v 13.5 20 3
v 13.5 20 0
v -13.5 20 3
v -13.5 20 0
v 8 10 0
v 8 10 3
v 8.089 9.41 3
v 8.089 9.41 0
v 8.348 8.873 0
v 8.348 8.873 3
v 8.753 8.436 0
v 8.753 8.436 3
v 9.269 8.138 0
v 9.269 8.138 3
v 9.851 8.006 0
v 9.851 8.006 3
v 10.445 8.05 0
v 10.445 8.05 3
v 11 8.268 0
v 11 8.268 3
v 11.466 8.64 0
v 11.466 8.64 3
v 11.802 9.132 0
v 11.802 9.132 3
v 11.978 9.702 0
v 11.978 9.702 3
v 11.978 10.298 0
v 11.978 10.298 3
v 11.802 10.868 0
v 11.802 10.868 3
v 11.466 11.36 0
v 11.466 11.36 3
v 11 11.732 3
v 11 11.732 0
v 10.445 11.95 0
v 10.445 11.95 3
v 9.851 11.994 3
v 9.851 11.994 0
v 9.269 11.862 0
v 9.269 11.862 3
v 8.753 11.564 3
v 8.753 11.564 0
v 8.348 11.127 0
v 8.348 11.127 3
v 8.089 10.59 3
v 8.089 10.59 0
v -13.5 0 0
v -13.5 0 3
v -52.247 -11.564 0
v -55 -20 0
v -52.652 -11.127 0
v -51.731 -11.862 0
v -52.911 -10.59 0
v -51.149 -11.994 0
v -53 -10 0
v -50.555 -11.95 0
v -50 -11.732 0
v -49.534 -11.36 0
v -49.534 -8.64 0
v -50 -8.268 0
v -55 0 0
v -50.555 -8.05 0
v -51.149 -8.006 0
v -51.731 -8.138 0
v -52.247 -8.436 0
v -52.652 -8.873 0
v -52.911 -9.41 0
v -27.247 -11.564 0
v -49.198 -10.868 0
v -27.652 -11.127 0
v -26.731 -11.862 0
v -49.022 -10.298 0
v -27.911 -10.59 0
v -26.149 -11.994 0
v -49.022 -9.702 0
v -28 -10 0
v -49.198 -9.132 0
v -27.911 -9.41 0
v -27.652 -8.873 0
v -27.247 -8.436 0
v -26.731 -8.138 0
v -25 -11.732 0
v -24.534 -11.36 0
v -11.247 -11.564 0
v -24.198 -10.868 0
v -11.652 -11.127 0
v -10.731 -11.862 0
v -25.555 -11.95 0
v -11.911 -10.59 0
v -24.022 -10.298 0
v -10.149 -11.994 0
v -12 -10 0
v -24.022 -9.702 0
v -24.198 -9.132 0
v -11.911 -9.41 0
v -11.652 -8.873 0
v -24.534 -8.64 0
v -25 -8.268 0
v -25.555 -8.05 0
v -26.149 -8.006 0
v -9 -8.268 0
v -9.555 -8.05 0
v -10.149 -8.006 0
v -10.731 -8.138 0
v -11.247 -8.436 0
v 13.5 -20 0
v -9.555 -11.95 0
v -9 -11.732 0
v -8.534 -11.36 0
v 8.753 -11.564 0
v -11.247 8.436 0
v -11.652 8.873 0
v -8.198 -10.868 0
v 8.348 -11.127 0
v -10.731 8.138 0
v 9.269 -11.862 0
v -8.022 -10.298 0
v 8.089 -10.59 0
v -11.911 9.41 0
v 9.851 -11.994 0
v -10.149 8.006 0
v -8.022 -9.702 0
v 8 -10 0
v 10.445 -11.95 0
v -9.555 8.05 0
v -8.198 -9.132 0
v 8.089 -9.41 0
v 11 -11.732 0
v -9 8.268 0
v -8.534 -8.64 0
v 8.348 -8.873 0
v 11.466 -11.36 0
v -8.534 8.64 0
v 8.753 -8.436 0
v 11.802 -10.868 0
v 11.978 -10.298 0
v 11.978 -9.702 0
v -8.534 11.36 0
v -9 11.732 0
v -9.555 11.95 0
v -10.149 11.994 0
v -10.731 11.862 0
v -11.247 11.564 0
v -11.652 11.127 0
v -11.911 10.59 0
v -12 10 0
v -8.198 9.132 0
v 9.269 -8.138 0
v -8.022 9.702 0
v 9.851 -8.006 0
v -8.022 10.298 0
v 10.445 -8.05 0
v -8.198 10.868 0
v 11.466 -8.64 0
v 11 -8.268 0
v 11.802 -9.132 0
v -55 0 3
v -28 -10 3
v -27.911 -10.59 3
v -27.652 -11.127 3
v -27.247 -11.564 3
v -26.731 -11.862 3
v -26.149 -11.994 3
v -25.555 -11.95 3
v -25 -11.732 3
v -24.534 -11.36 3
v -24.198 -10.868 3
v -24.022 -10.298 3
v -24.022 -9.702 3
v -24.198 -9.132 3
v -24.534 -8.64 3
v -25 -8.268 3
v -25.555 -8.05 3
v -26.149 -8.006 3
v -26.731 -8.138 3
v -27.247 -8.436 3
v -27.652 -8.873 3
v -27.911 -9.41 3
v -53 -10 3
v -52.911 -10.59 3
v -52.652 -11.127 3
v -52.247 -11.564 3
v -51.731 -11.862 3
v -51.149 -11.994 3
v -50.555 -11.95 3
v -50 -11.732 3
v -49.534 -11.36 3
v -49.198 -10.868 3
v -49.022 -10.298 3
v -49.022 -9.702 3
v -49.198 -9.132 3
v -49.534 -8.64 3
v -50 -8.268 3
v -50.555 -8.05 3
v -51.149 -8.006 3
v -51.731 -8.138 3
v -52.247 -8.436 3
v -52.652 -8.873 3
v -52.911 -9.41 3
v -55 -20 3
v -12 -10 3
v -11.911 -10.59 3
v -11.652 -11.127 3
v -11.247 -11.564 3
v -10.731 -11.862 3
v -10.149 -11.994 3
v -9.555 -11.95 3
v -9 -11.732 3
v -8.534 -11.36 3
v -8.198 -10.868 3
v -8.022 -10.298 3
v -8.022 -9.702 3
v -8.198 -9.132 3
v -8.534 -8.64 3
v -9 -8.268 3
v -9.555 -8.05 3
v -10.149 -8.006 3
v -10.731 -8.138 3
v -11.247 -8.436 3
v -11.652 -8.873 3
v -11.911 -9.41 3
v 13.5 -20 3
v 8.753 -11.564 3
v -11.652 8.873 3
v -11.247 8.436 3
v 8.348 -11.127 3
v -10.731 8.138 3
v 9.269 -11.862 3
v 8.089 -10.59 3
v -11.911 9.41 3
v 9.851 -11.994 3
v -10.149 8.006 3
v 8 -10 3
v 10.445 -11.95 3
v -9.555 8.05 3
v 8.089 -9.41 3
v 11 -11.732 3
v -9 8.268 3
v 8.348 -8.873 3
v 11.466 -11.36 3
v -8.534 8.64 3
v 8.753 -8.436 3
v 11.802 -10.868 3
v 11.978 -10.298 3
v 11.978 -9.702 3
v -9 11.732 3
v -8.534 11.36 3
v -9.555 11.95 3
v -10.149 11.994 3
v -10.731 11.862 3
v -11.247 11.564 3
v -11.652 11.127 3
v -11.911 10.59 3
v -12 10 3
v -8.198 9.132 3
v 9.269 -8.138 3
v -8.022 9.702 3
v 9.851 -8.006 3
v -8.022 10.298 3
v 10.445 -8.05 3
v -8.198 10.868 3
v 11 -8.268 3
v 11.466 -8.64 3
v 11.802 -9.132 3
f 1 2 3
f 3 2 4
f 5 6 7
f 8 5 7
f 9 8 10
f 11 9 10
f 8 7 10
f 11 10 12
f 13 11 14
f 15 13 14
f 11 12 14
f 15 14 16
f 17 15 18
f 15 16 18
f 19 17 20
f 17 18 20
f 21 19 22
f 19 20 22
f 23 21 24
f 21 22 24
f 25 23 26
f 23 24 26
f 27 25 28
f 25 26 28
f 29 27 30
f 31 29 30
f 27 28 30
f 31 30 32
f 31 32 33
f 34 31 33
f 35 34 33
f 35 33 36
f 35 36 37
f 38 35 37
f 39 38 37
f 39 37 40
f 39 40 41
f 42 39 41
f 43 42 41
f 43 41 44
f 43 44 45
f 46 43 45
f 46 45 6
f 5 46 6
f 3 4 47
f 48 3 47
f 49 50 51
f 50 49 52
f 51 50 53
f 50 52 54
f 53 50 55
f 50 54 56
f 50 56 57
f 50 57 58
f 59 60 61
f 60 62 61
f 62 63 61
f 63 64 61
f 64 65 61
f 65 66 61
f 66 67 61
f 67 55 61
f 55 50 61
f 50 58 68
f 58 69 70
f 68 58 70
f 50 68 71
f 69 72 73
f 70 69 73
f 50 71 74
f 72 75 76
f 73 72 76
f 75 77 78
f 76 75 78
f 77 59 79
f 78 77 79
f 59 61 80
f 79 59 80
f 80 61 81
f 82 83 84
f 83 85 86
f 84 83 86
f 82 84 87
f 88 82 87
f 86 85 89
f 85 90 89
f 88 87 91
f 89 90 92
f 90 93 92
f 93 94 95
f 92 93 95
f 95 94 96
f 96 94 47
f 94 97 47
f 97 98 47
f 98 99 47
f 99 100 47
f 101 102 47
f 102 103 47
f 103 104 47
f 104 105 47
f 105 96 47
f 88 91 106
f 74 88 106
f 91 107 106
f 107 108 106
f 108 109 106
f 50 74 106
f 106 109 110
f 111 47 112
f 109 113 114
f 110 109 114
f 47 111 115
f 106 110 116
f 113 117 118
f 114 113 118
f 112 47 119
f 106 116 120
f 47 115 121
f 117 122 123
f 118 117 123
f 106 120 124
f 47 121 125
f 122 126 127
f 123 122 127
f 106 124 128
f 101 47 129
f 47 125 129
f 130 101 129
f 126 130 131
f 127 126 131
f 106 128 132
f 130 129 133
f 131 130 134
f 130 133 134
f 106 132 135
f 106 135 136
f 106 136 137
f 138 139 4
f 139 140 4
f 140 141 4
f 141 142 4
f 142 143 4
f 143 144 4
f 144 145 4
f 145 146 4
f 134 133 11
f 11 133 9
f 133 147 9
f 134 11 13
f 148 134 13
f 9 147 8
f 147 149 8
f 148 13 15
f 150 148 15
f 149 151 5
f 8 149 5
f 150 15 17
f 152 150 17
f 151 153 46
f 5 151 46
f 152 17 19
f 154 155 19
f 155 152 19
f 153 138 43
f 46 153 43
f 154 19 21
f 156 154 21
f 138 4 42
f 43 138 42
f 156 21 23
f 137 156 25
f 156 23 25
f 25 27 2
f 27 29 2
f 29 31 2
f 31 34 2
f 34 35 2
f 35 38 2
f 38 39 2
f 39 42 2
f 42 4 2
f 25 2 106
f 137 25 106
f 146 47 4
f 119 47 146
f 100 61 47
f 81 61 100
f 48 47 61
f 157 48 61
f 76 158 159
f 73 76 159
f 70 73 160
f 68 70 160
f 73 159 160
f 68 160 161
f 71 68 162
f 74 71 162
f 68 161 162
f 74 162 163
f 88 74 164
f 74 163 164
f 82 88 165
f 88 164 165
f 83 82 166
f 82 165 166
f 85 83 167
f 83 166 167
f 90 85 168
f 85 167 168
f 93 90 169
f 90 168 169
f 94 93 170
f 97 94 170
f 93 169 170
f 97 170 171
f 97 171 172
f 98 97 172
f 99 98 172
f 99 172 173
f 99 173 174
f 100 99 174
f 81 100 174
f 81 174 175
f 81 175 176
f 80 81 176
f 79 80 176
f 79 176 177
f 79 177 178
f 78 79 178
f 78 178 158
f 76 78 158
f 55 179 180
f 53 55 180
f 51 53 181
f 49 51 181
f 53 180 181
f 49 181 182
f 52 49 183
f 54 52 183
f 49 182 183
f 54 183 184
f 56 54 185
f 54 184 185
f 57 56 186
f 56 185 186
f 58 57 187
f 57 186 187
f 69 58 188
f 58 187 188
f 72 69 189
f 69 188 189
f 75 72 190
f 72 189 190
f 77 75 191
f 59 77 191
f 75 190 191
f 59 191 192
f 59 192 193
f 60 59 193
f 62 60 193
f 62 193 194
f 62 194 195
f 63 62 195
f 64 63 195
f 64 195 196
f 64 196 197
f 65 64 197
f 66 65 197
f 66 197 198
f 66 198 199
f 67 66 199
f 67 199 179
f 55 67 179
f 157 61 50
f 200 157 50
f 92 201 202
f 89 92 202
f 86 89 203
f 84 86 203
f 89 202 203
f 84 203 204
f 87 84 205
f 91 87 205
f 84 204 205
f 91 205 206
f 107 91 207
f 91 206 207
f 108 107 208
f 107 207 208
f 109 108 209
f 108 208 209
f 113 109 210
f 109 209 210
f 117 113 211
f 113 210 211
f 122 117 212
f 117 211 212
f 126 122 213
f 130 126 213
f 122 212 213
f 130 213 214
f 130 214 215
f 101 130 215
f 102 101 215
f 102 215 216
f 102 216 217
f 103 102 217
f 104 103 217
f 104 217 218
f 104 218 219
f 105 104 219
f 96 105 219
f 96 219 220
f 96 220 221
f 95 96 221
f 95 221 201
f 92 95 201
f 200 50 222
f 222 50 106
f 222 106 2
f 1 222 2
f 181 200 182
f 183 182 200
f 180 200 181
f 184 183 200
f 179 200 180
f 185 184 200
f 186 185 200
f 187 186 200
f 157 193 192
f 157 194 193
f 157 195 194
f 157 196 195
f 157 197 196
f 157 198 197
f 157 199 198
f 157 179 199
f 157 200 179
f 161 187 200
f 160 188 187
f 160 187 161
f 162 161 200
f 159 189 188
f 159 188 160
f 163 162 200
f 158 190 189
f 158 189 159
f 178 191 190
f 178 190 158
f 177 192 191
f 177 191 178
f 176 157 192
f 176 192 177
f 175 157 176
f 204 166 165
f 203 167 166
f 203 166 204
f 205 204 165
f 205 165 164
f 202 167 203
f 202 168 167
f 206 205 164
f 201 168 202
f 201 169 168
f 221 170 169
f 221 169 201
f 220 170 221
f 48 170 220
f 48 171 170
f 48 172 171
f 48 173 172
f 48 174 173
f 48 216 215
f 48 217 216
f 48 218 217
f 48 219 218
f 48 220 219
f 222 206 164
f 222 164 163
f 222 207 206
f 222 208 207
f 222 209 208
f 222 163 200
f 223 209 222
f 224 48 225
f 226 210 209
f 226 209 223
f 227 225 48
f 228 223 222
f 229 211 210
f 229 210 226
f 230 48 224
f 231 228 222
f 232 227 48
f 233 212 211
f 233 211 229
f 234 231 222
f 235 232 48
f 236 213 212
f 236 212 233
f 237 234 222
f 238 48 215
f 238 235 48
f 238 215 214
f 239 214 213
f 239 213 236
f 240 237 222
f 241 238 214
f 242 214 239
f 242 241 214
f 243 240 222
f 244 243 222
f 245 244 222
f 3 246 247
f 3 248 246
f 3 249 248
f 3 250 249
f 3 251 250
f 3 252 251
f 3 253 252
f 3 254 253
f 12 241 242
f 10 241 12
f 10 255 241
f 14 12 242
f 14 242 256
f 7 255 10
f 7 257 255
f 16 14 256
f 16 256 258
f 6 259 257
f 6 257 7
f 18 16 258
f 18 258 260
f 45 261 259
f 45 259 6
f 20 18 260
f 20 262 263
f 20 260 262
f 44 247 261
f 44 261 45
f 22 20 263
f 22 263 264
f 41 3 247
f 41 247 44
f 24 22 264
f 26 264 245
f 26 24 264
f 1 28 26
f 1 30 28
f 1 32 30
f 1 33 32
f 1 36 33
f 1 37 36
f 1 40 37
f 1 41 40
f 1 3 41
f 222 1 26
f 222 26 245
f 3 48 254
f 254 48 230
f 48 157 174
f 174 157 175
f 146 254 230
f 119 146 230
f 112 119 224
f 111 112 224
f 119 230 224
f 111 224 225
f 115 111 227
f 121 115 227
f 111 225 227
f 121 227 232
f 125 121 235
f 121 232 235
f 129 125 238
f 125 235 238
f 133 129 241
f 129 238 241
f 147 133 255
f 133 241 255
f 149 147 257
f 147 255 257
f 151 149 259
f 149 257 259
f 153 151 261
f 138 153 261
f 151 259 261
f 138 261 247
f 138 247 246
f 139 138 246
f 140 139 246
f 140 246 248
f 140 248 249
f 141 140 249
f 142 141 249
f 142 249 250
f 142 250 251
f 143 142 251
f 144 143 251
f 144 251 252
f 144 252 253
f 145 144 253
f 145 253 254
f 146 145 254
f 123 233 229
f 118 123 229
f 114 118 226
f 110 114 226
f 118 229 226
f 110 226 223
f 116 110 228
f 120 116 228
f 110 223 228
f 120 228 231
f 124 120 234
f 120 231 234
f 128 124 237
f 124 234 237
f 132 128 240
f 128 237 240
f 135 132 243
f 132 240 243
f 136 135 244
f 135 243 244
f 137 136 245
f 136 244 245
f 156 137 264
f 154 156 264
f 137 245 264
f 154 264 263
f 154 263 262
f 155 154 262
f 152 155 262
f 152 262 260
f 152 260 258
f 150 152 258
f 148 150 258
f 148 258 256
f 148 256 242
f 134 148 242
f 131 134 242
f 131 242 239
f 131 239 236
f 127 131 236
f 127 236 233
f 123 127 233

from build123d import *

# Parameters (mm, degrees)
F1_DEPTH = 3
F2_D     = 4


with BuildPart() as f1:
    # F0 (on Top) → F1 (new body)
    with BuildSketch(Plane.XY):
        Polygon((-13.5, -20), (13.5, -20), (13.5, 20), (-13.5, 20), (-13.5, 0), (-55, 0), (-55, -4.7585600987), (-55, -20), align=None)
    extrude(amount=F1_DEPTH)

    # F2 (through all)
    with Locations(Plane(origin=(0, 0, 0), x_dir=(1, 0, 0), z_dir=(0, 0, -1))):
        with Locations((-51, 10), (-26, 10), (-10, 10), (10, -10), (10, 10), (-10, -10)):
            Hole(F2_D / 2)


solid = f1.part
